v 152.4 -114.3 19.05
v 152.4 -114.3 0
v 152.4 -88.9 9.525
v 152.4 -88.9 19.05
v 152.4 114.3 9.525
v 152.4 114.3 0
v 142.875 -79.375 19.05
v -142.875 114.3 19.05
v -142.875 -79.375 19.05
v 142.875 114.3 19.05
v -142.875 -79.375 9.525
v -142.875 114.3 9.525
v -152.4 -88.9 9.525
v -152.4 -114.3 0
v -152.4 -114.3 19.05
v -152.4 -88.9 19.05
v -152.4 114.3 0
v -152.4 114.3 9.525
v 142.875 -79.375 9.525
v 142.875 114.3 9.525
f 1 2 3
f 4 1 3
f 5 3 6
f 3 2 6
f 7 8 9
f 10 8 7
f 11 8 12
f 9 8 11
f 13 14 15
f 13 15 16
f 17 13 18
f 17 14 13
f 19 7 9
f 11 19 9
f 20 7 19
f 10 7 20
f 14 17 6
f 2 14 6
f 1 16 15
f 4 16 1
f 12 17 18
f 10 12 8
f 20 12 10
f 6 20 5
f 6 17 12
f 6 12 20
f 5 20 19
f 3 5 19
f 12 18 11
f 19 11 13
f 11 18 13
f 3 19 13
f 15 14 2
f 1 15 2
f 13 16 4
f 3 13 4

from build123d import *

# Parameters (mm, degrees)
F0_W     = 304.8
F0_H     = 228.6
F1_DEPTH = 19.05
F3_DEPTH = 9.525
F4_W     = 193.675
F4_H     = 19.05
F5_DEPTH = 9.525
F6_W     = 193.675
F6_H     = 19.05
F7_DEPTH = 9.525


with BuildPart() as f1:
    # F0 (on Top) → F1 (new body)
    with BuildSketch(Plane.XY):
        Rectangle(F0_W, F0_H)
    extrude(amount=F1_DEPTH)

    # F2 (on face) → F3 (cut)
    with BuildSketch(Plane.XY.offset(19.05)):
        Polygon((188.140169, -88.9), (188.140169, -79.375), (-188.140169, -79.375), (-188.140169, -88.9), (0, -88.9), align=None)
    extrude(amount=-F3_DEPTH, mode=Mode.SUBTRACT)

    # F4 (on face) → F5 (cut)
    with BuildSketch(Plane(origin=(-152.4, 0, 0), x_dir=(0, -1, 0), z_dir=(-1, 0, 0))):
        with Locations((-17.4625, 19.05)):
            Rectangle(F4_W, F4_H)
    extrude(amount=-F5_DEPTH, mode=Mode.SUBTRACT)

    # F6 (on face) → F7 (cut)
    with BuildSketch(Plane.YZ.offset(152.4)):
        with Locations((17.4625, 19.05)):
            Rectangle(F6_W, F6_H)
    extrude(amount=-F7_DEPTH, mode=Mode.SUBTRACT)


solid = f1.part
